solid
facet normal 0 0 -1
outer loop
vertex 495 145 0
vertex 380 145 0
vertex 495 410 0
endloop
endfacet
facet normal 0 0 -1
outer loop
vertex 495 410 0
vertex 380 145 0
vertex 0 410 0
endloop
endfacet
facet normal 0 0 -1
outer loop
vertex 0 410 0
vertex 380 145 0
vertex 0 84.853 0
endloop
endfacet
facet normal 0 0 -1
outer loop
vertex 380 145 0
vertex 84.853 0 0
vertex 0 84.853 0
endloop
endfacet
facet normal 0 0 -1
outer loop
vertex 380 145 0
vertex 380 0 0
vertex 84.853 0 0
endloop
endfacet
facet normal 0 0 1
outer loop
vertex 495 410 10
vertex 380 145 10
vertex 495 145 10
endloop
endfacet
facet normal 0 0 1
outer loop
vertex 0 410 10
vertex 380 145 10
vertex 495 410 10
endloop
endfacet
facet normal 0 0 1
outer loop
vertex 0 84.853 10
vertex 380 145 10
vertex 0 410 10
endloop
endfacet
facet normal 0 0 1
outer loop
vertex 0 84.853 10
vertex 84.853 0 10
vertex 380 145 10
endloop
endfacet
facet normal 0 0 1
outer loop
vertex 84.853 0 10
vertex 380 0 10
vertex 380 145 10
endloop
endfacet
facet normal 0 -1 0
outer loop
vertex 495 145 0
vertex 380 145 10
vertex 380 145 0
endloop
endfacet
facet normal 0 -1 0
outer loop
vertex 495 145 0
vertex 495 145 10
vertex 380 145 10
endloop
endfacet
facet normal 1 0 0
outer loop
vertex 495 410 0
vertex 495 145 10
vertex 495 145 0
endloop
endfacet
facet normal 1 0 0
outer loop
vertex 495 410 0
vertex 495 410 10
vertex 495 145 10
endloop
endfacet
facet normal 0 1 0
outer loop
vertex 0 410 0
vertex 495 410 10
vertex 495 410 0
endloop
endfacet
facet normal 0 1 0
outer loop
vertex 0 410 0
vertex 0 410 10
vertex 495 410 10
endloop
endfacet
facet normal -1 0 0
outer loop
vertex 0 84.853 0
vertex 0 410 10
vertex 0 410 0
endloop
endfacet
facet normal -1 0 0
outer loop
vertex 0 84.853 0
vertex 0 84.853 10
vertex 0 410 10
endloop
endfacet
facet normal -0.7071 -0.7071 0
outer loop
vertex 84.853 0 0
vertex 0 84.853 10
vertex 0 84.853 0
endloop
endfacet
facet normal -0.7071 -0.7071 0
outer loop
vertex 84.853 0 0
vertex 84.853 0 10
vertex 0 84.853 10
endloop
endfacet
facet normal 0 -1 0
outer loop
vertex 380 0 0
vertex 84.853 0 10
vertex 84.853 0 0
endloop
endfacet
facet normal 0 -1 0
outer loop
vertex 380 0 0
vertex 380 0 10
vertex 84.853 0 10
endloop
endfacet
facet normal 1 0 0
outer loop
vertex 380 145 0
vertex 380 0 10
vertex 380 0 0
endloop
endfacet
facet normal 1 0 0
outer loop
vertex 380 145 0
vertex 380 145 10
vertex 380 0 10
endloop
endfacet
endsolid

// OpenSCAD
module floor(house_sz, front_cut_diag, toilet_cut_d, floor_thickness=10)
{
    c = sqrt(2) * front_cut_diag;
    points = [ 
        [0, house_sz[1]], 
        [house_sz[0], house_sz[1]],
        [house_sz[0], toilet_cut_d[1]],
        [house_sz[0] - toilet_cut_d[0], toilet_cut_d[1]],
        [house_sz[0] - toilet_cut_d[0], 0],
        [c, 0],
        [0, c]];
    
   linear_extrude(floor_thickness)
        polygon(points);
}

floor(house_sz = [495, 410], front_cut_diag = 60, toilet_cut_d = [115, 145]);
